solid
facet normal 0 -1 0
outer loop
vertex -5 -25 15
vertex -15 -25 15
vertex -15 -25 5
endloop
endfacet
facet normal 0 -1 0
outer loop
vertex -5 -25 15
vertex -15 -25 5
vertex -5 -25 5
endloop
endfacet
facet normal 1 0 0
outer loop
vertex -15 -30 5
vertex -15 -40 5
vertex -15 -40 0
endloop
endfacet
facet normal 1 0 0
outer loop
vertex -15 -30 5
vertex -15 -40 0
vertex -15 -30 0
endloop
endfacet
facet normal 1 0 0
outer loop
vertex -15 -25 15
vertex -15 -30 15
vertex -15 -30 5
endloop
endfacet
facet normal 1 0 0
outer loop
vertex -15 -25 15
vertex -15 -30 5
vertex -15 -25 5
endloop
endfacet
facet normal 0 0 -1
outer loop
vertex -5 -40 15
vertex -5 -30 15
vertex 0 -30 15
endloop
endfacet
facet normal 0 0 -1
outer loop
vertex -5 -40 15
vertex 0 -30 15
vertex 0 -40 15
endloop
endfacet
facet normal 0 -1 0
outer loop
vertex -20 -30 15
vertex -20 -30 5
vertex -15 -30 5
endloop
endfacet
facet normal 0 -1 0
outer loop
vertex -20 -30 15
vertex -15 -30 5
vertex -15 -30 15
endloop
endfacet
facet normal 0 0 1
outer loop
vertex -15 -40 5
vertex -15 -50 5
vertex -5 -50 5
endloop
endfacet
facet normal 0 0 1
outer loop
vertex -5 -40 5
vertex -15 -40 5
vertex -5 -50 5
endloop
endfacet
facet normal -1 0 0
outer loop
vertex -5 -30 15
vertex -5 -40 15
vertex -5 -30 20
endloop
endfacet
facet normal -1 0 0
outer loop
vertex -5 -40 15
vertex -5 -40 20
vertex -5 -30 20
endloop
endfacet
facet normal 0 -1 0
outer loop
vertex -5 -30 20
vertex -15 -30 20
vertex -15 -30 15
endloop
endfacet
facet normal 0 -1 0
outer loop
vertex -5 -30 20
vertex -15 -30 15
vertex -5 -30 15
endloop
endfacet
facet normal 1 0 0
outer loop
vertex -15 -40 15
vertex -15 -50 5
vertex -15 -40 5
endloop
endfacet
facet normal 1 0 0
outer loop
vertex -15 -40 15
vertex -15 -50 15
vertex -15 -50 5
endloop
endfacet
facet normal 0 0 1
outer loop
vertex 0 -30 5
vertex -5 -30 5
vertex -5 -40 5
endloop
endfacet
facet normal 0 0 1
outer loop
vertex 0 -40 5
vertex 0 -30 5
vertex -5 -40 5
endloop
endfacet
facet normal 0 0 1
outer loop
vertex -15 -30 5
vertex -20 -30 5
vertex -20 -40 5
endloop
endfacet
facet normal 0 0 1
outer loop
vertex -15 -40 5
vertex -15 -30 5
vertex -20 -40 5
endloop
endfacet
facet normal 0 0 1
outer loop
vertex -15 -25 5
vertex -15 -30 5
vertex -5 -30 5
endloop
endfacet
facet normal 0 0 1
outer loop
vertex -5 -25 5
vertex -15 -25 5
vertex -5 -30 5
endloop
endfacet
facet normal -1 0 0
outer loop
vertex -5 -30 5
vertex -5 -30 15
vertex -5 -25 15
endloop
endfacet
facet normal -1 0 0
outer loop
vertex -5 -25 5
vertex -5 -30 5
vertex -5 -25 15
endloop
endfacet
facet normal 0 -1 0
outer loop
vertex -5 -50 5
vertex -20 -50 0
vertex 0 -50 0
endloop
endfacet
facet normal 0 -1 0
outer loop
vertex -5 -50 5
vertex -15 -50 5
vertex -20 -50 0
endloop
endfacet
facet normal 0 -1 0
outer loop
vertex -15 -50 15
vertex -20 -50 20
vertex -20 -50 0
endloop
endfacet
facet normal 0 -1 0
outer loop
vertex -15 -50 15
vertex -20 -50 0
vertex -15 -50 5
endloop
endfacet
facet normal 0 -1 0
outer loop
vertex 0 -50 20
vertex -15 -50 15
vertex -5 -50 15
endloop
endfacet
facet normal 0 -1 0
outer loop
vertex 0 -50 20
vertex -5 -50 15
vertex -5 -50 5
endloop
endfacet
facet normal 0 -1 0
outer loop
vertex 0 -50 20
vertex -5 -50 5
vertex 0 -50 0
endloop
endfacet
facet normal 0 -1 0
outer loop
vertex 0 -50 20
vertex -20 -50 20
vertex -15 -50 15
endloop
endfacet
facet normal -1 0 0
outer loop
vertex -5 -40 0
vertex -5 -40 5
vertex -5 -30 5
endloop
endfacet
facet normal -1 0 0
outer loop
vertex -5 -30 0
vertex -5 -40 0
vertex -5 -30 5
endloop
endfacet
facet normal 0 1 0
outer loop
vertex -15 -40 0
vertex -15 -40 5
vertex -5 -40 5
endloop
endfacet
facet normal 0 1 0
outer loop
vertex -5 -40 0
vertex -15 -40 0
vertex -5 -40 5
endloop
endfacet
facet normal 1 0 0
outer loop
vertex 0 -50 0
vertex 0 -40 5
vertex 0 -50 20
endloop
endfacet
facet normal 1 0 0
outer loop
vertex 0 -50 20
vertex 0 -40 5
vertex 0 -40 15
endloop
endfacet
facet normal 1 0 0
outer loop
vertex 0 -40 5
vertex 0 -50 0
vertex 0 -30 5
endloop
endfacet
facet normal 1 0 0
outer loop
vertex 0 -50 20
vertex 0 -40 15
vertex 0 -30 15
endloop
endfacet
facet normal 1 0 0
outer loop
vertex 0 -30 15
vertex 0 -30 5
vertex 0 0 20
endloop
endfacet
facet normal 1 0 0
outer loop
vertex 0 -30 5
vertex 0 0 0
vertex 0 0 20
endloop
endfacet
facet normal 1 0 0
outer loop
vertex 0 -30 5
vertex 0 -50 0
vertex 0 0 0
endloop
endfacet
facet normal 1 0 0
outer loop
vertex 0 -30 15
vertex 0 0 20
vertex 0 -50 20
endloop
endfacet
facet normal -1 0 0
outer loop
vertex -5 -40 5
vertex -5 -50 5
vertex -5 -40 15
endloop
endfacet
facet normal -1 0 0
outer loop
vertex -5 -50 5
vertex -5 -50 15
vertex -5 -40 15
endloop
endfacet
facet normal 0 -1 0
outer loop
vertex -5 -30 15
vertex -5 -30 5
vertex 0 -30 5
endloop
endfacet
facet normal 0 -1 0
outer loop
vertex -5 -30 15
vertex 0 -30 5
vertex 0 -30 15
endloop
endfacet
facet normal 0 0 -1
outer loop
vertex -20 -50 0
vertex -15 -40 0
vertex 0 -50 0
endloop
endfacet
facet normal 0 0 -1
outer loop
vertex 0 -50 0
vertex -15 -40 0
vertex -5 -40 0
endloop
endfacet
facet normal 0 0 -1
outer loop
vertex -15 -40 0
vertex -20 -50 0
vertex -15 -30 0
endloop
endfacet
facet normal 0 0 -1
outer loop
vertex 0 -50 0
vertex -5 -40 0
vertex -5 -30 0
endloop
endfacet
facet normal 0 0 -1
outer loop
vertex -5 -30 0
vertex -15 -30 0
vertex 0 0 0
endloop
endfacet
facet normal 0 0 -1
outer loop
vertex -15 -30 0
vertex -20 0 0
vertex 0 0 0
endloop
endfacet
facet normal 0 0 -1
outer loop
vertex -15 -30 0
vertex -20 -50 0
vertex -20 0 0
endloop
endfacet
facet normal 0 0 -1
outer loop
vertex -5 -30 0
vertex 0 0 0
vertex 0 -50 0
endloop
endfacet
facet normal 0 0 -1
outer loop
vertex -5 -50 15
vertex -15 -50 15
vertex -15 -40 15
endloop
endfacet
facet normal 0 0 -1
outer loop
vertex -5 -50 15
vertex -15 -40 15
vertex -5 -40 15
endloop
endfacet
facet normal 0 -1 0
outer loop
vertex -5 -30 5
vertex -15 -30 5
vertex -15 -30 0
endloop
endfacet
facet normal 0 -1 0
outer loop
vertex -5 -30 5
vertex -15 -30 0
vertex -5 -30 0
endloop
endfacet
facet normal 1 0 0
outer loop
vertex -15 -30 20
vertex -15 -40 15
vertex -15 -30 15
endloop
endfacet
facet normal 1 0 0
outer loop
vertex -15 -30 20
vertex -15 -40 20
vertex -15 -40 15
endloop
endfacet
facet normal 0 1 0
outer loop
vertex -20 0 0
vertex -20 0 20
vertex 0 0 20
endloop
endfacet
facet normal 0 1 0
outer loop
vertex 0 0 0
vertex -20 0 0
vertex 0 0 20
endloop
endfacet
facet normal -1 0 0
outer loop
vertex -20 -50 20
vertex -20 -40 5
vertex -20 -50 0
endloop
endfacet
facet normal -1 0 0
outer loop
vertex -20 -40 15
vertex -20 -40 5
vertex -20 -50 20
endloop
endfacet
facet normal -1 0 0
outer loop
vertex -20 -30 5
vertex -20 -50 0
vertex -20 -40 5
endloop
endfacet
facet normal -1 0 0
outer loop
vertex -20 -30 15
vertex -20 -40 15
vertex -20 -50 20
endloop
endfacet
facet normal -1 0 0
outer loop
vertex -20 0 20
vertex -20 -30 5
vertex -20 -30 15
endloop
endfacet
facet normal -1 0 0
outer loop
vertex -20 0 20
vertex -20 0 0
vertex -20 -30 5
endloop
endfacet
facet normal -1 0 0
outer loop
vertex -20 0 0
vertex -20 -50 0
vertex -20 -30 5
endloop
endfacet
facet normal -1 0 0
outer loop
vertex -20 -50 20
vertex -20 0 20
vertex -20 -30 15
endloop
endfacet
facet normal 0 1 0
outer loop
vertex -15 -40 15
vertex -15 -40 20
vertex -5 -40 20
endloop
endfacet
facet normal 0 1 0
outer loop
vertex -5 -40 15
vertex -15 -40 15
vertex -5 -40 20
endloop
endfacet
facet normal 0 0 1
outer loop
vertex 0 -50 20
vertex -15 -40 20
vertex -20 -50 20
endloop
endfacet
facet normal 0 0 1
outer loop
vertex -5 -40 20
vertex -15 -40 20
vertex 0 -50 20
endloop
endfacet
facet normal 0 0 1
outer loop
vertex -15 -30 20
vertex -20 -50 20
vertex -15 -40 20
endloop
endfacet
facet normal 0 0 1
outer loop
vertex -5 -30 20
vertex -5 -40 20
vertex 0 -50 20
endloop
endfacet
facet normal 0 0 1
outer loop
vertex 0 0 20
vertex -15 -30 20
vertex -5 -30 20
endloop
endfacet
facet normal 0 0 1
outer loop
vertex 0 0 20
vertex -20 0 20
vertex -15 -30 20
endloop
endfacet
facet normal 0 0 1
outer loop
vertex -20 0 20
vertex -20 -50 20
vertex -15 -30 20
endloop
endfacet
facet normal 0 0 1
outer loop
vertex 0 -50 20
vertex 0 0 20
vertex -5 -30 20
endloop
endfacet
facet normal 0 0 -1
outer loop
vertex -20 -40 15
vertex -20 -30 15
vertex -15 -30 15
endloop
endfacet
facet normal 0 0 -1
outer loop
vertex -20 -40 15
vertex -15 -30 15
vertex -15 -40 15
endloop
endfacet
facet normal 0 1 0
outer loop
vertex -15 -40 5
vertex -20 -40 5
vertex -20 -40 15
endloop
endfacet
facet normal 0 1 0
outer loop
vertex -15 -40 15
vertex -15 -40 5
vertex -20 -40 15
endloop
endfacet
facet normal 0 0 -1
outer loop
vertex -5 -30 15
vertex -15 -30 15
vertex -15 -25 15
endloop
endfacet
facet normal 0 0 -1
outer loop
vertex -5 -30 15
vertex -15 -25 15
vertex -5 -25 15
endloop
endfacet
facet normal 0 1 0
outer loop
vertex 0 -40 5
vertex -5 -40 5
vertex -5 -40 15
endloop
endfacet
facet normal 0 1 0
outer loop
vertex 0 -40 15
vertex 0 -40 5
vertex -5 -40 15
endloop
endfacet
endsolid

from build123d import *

# Parameters (mm, degrees)
F0_W     = 20
F0_H     = 20
F1_DEPTH = 50
F2_W     = 10
F2_H     = 10
F3_DEPTH = 25
F4_W     = 10
F4_H     = 10
F5_DEPTH = 25
F6_W     = 10
F6_H     = 10
F7_DEPTH = 25


with BuildPart() as f1:
    # F0 (on Front) → F1 (new body)
    with BuildSketch(Plane.XZ):
        with Locations((-10, 10)):
            Rectangle(F0_W, F0_H)
    extrude(amount=F1_DEPTH)

    # F2 (on face) → F3 (cut)
    with BuildSketch(Plane.XZ.offset(50)):
        with Locations((-10, 10)):
            Rectangle(F2_W, F2_H)
    extrude(amount=-F3_DEPTH, mode=Mode.SUBTRACT)

    # F4 (on face) → F5 (cut)
    with BuildSketch(Plane.XY.offset(20)):
        with Locations((-10, -35)):
            Rectangle(F4_W, F4_H)
    extrude(amount=-F5_DEPTH, mode=Mode.SUBTRACT)

    # F6 (on face) → F7 (cut)
    with BuildSketch(Plane(origin=(-20, 0, 0), x_dir=(0, -1, 0), z_dir=(-1, 0, 0))):
        with Locations((35, 10)):
            Rectangle(F6_W, F6_H)
    extrude(amount=-F7_DEPTH, mode=Mode.SUBTRACT)


solid = f1.part
